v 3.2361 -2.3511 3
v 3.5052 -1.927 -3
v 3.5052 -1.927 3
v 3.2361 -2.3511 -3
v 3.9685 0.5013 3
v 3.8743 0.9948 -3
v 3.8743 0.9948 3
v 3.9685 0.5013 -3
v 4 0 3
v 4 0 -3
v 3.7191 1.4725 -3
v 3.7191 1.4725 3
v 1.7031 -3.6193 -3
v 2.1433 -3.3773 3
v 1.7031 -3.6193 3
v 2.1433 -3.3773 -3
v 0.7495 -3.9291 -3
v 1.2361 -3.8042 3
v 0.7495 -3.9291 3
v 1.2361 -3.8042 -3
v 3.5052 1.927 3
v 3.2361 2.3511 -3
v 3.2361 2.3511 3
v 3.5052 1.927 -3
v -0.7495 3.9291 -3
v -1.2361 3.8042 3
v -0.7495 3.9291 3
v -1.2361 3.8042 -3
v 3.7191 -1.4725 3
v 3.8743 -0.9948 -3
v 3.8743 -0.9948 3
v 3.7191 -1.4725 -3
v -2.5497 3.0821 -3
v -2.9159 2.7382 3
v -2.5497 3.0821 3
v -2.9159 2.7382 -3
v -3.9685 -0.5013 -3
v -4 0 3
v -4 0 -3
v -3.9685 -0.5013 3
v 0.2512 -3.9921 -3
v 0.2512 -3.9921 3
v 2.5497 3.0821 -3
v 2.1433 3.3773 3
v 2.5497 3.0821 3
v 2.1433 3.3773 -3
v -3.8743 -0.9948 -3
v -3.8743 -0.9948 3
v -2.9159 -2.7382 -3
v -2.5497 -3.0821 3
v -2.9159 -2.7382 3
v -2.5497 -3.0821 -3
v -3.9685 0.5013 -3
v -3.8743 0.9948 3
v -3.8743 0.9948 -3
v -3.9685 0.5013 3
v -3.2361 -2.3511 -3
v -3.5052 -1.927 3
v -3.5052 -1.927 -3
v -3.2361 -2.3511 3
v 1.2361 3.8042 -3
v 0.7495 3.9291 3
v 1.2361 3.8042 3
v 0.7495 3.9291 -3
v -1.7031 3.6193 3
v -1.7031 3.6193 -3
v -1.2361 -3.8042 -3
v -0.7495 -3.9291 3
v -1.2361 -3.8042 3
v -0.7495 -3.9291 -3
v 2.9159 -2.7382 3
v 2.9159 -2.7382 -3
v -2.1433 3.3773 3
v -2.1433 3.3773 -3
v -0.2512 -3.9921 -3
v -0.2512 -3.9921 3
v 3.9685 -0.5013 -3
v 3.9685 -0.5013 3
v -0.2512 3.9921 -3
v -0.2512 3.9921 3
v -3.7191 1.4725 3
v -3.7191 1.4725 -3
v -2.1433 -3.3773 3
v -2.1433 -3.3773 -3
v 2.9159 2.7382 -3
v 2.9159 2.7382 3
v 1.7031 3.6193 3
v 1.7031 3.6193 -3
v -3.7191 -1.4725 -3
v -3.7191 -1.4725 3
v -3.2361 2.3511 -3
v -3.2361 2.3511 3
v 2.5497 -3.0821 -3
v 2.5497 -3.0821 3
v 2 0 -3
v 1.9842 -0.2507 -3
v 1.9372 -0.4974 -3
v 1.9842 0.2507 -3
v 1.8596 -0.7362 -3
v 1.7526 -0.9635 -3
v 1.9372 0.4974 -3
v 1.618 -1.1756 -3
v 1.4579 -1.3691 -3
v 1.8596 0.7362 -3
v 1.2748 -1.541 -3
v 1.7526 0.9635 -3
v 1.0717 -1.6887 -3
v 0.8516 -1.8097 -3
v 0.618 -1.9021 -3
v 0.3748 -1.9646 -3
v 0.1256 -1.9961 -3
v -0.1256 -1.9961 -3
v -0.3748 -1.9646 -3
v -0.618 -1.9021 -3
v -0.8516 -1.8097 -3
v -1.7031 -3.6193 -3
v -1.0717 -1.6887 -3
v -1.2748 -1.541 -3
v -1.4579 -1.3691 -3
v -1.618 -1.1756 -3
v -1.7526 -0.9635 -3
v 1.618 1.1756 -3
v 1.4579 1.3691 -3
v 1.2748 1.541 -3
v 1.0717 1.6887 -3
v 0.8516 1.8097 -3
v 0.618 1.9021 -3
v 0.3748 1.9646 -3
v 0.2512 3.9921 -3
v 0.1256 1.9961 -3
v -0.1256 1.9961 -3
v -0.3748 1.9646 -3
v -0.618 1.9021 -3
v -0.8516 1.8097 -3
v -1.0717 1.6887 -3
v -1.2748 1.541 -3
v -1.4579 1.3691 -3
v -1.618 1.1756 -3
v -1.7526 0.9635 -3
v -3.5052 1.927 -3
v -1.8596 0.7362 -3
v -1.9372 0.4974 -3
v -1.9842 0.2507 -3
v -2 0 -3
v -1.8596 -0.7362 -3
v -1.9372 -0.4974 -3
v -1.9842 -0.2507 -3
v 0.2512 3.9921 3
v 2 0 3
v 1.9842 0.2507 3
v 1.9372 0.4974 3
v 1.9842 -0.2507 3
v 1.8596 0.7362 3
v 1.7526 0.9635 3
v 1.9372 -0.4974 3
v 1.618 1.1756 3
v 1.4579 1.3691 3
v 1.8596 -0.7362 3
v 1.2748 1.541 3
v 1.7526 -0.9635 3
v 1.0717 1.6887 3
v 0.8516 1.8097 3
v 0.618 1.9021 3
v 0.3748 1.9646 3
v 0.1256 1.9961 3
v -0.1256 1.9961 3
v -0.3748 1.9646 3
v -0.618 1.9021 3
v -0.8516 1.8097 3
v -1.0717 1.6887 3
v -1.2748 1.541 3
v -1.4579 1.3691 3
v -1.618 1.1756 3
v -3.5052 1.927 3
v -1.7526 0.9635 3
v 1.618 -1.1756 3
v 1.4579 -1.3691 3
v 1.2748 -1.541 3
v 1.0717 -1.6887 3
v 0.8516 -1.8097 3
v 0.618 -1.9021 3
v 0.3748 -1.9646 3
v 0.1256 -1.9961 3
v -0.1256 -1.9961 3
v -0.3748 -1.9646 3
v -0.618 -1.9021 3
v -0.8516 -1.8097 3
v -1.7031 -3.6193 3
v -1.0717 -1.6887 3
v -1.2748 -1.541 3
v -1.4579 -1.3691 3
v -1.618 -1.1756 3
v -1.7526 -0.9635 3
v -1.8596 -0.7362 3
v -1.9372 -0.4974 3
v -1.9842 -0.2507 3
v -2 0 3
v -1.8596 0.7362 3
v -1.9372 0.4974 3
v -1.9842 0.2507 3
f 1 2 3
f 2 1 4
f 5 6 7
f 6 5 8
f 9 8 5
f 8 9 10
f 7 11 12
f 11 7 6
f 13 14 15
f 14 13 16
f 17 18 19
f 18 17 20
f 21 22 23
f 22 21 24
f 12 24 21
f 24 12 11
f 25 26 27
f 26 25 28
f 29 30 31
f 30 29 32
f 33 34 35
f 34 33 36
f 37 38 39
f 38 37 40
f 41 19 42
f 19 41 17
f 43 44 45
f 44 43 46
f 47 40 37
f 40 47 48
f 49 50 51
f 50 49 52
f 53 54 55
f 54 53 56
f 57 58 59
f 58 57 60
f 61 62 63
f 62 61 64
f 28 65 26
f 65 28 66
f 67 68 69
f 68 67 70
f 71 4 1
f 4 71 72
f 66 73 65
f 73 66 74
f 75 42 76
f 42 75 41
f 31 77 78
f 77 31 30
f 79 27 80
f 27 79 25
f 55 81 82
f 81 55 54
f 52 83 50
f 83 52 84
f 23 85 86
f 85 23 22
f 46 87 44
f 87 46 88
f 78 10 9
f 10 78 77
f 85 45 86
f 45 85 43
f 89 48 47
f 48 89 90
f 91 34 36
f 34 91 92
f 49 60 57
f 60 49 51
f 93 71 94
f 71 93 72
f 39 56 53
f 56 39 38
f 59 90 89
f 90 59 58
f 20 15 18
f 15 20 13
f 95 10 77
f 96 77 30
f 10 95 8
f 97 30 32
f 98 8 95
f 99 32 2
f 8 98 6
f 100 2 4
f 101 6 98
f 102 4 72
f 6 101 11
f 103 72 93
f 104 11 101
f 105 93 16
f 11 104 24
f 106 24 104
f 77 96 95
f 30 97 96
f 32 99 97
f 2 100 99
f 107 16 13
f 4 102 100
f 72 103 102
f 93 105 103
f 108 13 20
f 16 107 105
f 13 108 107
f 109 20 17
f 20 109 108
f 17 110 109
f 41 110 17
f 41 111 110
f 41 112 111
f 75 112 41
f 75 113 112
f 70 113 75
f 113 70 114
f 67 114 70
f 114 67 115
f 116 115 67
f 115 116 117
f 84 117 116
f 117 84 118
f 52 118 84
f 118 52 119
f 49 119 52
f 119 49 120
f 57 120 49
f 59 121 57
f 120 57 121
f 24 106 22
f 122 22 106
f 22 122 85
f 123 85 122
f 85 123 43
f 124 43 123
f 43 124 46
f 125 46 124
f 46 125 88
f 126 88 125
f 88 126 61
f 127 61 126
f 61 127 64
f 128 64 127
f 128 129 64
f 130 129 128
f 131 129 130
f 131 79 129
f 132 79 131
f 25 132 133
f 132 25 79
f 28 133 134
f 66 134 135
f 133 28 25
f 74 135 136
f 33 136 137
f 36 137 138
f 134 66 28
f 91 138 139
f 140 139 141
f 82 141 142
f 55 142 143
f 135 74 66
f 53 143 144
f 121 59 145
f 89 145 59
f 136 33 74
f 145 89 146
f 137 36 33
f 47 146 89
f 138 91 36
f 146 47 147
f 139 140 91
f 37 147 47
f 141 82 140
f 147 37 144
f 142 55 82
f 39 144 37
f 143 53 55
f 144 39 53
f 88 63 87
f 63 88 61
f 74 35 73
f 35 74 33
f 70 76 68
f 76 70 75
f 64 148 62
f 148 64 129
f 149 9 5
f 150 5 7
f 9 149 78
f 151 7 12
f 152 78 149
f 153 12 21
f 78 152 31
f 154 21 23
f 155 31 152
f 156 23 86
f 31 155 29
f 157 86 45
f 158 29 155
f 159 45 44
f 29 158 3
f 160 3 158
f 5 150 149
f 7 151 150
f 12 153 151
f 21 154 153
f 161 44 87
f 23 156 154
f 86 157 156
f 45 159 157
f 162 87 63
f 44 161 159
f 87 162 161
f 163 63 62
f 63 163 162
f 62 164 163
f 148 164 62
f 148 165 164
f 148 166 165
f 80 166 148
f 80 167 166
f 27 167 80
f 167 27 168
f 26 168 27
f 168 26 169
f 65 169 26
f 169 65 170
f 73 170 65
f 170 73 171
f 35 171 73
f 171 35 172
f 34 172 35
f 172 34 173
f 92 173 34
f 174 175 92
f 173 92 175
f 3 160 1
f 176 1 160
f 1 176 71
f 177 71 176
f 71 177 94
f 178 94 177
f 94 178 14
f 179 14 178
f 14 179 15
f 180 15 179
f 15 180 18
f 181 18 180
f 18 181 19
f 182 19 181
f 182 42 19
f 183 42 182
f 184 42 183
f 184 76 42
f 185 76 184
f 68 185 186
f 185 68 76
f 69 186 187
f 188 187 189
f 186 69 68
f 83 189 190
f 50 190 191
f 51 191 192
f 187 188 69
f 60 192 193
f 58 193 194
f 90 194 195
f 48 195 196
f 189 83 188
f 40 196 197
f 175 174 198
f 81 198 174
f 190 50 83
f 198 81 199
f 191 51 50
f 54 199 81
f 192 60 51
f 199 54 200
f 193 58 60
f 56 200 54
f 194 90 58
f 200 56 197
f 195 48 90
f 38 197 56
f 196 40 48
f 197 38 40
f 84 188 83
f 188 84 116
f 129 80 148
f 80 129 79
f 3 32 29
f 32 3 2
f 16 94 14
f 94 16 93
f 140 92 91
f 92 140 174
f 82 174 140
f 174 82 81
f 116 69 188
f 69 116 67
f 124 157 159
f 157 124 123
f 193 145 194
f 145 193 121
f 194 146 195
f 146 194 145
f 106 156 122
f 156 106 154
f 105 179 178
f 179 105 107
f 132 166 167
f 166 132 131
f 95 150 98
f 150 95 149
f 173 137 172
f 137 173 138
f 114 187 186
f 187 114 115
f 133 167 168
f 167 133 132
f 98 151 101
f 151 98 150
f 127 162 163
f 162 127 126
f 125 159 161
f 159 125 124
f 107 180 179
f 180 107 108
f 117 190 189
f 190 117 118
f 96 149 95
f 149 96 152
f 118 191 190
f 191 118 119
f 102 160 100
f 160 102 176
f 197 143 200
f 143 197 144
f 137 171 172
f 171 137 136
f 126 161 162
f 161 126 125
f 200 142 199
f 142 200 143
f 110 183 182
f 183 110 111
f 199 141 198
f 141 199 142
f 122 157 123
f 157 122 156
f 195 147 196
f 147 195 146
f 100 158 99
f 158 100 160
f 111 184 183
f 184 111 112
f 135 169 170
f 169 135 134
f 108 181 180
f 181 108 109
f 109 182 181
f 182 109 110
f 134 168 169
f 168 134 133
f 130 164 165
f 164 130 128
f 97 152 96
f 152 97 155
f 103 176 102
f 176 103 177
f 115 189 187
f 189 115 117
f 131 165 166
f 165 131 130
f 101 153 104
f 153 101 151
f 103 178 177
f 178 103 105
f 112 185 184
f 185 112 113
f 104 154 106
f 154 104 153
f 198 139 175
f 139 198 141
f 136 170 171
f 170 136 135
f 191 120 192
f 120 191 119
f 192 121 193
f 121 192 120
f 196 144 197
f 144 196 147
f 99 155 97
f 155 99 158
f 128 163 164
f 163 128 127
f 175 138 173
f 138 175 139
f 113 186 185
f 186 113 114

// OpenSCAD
$fn = 50;


difference() {
	union() {
		translate(v = [0, 0, -3.0000000000]) {
			cylinder(h = 6, r = 4.0000000000);
		}
	}
	union() {
		translate(v = [0, 0, -100.0000000000]) {
			cylinder(h = 200, r = 2.0000000000);
		}
	}
}
